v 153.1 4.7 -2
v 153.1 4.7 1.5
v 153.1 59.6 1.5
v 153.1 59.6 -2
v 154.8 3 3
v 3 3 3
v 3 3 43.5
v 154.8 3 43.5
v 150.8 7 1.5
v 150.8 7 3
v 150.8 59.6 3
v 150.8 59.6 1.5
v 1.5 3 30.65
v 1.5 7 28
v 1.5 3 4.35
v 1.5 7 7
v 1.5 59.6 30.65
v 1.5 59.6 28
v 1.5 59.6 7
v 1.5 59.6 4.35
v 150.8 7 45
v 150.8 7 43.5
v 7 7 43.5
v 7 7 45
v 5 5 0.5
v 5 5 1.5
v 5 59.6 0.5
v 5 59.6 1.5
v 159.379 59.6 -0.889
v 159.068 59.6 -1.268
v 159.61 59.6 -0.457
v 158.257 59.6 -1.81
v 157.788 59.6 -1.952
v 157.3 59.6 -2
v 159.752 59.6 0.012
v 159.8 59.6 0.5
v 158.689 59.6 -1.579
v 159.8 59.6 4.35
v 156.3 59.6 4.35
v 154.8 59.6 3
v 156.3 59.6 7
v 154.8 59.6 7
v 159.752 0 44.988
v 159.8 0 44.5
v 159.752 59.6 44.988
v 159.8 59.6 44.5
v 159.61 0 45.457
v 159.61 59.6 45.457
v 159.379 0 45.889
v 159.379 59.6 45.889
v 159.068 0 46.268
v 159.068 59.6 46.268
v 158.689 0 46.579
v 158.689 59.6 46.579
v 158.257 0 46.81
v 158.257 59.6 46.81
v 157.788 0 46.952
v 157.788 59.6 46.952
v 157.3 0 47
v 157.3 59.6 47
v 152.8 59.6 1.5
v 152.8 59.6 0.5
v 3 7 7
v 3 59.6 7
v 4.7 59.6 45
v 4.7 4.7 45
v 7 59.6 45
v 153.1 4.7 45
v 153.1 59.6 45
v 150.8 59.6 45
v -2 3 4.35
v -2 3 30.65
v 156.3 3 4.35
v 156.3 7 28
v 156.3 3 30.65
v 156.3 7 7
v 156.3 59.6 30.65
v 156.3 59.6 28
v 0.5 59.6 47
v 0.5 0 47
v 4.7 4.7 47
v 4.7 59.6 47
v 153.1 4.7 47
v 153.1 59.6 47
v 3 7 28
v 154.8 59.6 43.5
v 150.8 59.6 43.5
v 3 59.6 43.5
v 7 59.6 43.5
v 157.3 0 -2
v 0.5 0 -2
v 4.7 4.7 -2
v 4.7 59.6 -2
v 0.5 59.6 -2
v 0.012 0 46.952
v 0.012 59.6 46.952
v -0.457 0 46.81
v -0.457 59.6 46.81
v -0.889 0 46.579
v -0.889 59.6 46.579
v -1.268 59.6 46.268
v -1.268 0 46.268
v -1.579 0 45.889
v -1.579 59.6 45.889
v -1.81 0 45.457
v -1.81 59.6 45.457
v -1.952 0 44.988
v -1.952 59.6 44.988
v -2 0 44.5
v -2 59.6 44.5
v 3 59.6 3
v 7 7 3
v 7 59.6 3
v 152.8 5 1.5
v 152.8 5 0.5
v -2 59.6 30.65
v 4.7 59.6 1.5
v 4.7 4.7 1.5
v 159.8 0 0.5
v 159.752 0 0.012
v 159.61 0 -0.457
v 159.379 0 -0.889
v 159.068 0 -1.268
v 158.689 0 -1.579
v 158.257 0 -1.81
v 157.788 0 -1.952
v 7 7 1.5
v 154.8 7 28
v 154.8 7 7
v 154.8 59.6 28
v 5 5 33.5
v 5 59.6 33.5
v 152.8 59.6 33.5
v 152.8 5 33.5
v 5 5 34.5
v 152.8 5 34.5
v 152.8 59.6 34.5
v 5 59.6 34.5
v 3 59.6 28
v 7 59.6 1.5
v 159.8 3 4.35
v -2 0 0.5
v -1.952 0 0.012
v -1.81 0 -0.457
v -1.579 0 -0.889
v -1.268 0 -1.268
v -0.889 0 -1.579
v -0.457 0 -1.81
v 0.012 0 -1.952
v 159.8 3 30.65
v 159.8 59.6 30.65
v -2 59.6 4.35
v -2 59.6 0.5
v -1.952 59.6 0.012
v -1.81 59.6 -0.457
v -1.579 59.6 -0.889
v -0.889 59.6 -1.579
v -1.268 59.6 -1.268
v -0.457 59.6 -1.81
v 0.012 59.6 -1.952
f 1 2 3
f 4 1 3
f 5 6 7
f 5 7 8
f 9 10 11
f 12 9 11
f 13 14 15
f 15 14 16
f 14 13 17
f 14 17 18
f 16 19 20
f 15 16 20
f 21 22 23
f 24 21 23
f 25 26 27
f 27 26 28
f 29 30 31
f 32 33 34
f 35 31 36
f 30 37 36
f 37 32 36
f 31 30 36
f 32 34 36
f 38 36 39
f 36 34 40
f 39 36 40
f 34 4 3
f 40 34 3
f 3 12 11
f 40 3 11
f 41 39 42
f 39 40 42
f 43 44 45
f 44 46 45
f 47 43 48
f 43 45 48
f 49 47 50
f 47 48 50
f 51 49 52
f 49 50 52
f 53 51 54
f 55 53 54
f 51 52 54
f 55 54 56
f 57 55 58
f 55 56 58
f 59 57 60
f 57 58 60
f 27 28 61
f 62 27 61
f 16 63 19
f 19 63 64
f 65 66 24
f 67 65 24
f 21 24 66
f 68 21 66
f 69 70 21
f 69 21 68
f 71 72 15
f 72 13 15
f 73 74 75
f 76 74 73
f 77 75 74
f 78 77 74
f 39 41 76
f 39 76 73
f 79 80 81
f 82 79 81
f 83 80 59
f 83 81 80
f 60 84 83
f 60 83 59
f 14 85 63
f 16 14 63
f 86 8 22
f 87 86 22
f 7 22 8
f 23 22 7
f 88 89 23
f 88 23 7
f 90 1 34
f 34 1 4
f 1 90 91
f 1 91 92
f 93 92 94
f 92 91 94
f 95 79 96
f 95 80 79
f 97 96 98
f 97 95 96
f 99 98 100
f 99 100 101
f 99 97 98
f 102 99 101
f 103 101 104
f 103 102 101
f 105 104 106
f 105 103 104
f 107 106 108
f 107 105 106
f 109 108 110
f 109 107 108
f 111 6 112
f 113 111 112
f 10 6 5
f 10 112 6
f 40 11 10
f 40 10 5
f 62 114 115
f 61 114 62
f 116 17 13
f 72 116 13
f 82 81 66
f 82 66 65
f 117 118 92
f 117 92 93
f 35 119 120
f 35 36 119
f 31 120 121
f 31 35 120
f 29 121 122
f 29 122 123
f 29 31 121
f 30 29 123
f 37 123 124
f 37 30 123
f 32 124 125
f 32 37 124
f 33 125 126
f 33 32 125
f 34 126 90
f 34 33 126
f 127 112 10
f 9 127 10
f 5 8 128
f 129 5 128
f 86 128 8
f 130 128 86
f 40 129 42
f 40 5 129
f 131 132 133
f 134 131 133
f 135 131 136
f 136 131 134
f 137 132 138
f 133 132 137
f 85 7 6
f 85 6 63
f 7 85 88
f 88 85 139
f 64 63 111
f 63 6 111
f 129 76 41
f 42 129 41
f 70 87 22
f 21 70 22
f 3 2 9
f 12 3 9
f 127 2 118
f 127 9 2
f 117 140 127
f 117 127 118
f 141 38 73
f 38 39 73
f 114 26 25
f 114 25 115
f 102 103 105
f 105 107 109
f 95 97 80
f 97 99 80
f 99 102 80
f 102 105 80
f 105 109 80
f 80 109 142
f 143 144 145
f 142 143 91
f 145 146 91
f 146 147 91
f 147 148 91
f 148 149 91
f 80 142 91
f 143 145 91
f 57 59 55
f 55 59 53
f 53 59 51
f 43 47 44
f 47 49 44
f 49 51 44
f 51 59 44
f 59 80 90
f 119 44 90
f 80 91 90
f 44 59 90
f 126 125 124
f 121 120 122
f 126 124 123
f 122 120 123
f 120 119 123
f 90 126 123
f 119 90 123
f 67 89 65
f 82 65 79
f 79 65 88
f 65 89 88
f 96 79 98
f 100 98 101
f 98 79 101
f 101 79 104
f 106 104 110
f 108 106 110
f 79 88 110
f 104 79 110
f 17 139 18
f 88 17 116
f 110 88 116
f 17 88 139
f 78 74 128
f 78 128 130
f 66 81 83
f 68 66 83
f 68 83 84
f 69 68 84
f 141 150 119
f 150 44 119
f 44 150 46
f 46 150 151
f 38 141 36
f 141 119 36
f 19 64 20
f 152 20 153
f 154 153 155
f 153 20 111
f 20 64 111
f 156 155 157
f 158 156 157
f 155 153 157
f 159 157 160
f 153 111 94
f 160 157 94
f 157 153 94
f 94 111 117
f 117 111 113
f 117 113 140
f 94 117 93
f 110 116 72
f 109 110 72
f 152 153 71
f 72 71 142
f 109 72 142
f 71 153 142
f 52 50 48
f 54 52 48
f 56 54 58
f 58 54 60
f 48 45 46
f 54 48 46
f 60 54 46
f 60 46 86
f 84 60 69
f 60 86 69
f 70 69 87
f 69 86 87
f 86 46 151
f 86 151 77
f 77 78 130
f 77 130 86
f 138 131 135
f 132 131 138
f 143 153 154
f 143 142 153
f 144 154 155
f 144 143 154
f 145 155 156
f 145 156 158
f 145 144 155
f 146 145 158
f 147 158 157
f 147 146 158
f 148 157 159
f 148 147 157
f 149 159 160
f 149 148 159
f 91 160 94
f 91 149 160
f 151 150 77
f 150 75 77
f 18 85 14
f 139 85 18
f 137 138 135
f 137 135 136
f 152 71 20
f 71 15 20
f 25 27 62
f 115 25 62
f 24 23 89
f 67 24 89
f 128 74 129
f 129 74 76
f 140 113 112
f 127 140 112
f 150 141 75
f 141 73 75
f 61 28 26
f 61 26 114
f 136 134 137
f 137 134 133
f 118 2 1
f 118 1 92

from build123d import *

# Parameters (mm, degrees)
SKETCH1_W            = 157.8
SKETCH1_H            = 59.6
BOSS_EXTRUDE1_DEPTH  = 35
SHELL1_T             = -3
SKETCH2_W            = 143.8
SKETCH2_H            = 50.6
SKETCH2_H_2          = 2
CUT_EXTRUDE1_DEPTH   = 173.273039098
SKETCH2_3_W          = 147.8
SKETCH2_3_H          = 54.6
CUT_EXTRUDE2_DEPTH   = 1.5
SKETCH3_W            = 21
SKETCH3_H            = 52.6
CUT_EXTRUDE3_DEPTH   = 173.273039098
SKETCH3_3_W          = 25
SKETCH3_3_H          = 54.6
CUT_EXTRUDE4_DEPTH   = 1.5
SKETCH4_W            = 147.8
SKETCH4_H            = 54.6
BOSS_EXTRUDE2_DEPTH  = 1
SKETCH5_W            = 25
SKETCH5_H            = 54.6
BOSS_EXTRUDE3_DEPTH  = 1
SKETCH6_W            = 25.3
SKETCH6_H            = 56.6
CUT_EXTRUDE5_DEPTH   = 1.5
SKETCH7_W            = 26.3
SKETCH7_H            = 56.6
CUT_EXTRUDE6_DEPTH   = 1.5
SKETCH8_W            = 26.3
SKETCH8_H            = 56.6
CUT_EXTRUDE7_DEPTH   = 1.5
BOSS_EXTRUDE4_DEPTH  = 2
BOSS_EXTRUDE5_DEPTH  = 2
BOSS_EXTRUDE6_DEPTH  = 2
BOSS_EXTRUDE7_DEPTH  = 2
BOSS_EXTRUDE8_DEPTH  = 10
CUT_EXTRUDE8_START   = -11.5
CUT_EXTRUDE8_DEPTH   = 2.5
BOSS_EXTRUDE10_DEPTH = 1.5
CUT_EXTRUDE9_DEPTH   = 11.5
CUT_EXTRUDE10_START  = -3.5
SKETCH16_W           = 148.4
SKETCH16_H           = 55.2
CUT_EXTRUDE10_DEPTH  = 3.5
SKETCH17_W           = 148.4
SKETCH17_H           = 55.2
CUT_EXTRUDE11_DEPTH  = 2
FILLET1_R            = 2.5


with BuildPart() as part:
    # Sketch1 → Boss-Extrude1 (new body)
    with BuildSketch(Plane.XY):
        with Locations((78.9, 29.8)):
            Rectangle(SKETCH1_W, SKETCH1_H)
    extrude(amount=BOSS_EXTRUDE1_DEPTH)

    # Shell1
    shell1_openings = [part.faces().sort_by_distance(p)[0] for p in [
        (78.9, 59.6, 17.5),
    ]]
    offset(amount=SHELL1_T, openings=shell1_openings, kind=Kind.INTERSECTION)

    # Sketch2 → Cut-Extrude1 (cut, through all)
    with BuildSketch(Plane.XY.offset(35)):
        with Locations((78.9, 32.3)):
            Rectangle(SKETCH2_W, SKETCH2_H)
        with Locations((78.9, 58.6)):
            Rectangle(SKETCH2_W, SKETCH2_H_2)
    extrude(amount=-CUT_EXTRUDE1_DEPTH, mode=Mode.SUBTRACT)

    # Sketch2<3> → Cut-Extrude2 (cut)
    with BuildSketch(Plane.XY.offset(35)):
        with Locations((78.9, 32.3)):
            Rectangle(SKETCH2_3_W, SKETCH2_3_H)
    cut_extrude2 = extrude(amount=-CUT_EXTRUDE2_DEPTH, mode=Mode.SUBTRACT)

    # Mirror1: Cut-Extrude2 across plane
    add(cut_extrude2.mirror(Plane.XY.offset(17.5)), mode=Mode.SUBTRACT)

    # Sketch3 → Cut-Extrude3 (cut, through all)
    with BuildSketch(Plane(origin=(157.8, 0, 0), x_dir=(0, 0, -1), z_dir=(1, 0, 0))):
        with Locations((-17.5, 33.3)):
            Rectangle(SKETCH3_W, SKETCH3_H)
    extrude(amount=-CUT_EXTRUDE3_DEPTH, mode=Mode.SUBTRACT)

    # Sketch3<3> → Cut-Extrude4 (cut)
    with BuildSketch(Plane(origin=(157.8, 0, 0), x_dir=(0, 0, -1), z_dir=(1, 0, 0))):
        with Locations((-17.5, 32.3)):
            Rectangle(SKETCH3_3_W, SKETCH3_3_H)
    cut_extrude4 = extrude(amount=-CUT_EXTRUDE4_DEPTH, mode=Mode.SUBTRACT)

    # Mirror2: Cut-Extrude4 across plane
    add(cut_extrude4.mirror(Plane(origin=(78.9, 0, 0), x_dir=(0, 0, 1), z_dir=(1, 0, 0))), mode=Mode.SUBTRACT)

    # Sketch6 → Cut-Extrude5 (cut)
    with BuildSketch(Plane(origin=(157.8, 0, 0), x_dir=(0, 0, -1), z_dir=(1, 0, 0))):
        with Locations((-17.5, 31.3)):
            Rectangle(SKETCH6_W, SKETCH6_H)
    cut_extrude5 = extrude(amount=-CUT_EXTRUDE5_DEPTH, mode=Mode.SUBTRACT)

    # Mirror5: Cut-Extrude5 across plane
    add(cut_extrude5.mirror(Plane(origin=(78.9, 0, 0), x_dir=(0, 0, 1), z_dir=(1, 0, 0))), mode=Mode.SUBTRACT)

    # Sketch7 → Cut-Extrude6 (cut)
    with BuildSketch(Plane(origin=(157.8, 0, 0), x_dir=(0, 0, -1), z_dir=(1, 0, 0))):
        with Locations((-17.5, 31.3)):
            Rectangle(SKETCH7_W, SKETCH7_H)
    extrude(amount=-CUT_EXTRUDE6_DEPTH, mode=Mode.SUBTRACT)

    # Sketch8 → Cut-Extrude7 (cut)
    with BuildSketch(Plane.ZY):
        with Locations((17.5, 31.3)):
            Rectangle(SKETCH8_W, SKETCH8_H)
    extrude(amount=-CUT_EXTRUDE7_DEPTH, mode=Mode.SUBTRACT)

    # Sketch9 → Boss-Extrude4 (add)
    with BuildSketch(Plane(origin=(0, 0, 0), x_dir=(-1, 0, 0), z_dir=(0, 0, -1))):
        Polygon((0, 59.6), (-5, 59.6), (-5, 5), (-152.8, 5), (-152.8, 59.6), (-157.8, 59.6), (-157.8, 0), (0, 0), align=None)
    extrude(amount=BOSS_EXTRUDE4_DEPTH)

    # Sketch10 → Boss-Extrude5 (add)
    with BuildSketch(Plane.XY.offset(35)):
        Polygon((152.8, 5), (5, 5), (5, 59.6), (0, 59.6), (0, 0), (157.8, 0), (157.8, 59.6), (152.8, 59.6), align=None)
    extrude(amount=BOSS_EXTRUDE5_DEPTH)

    # Sketch11 → Boss-Extrude6 (add)
    with BuildSketch(Plane.ZY):
        Polygon((30.65, 59.6), (30.65, 3), (4.35, 3), (4.35, 59.6), (-2, 59.6), (-2, 0), (37, 0), (37, 59.6), align=None)
    extrude(amount=BOSS_EXTRUDE6_DEPTH)

    # Sketch12 → Boss-Extrude7 (add)
    with BuildSketch(Plane(origin=(157.8, 0, 0), x_dir=(0, 0, -1), z_dir=(1, 0, 0))):
        Polygon((2, 59.6), (-4.35, 59.6), (-4.35, 3), (-30.65, 3), (-30.65, 59.6), (-37, 59.6), (-37, 0), (2, 0), align=None)
    extrude(amount=BOSS_EXTRUDE7_DEPTH)

    # Sketch13 → Boss-Extrude8 (add)
    with BuildSketch(Plane.XY.offset(37)):
        Polygon((152.8, 59.6), (152.8, 5), (5, 5), (5, 59.6), (-2, 59.6), (-2, 0), (159.8, 0), (159.8, 59.6), align=None)
    extrude(amount=BOSS_EXTRUDE8_DEPTH)

    # Sketch14 → Cut-Extrude8 (cut)
    with BuildSketch(Plane.XY.offset(43.5).offset(CUT_EXTRUDE8_START)):
        Polygon((150.8, 7), (7, 7), (7, 59.6), (5, 59.6), (5, 5), (152.8, 5), (152.8, 59.6), (150.8, 59.6), align=None)
    extrude(amount=CUT_EXTRUDE8_DEPTH, mode=Mode.SUBTRACT)

    # Sketch14<2> → Boss-Extrude10 (add)
    with BuildSketch(Plane.XY.offset(43.5)):
        Polygon((150.8, 7), (7, 7), (7, 59.6), (5, 59.6), (5, 5), (152.8, 5), (152.8, 59.6), (150.8, 59.6), align=None)
    extrude(amount=BOSS_EXTRUDE10_DEPTH)

    # Sketch15 → Cut-Extrude9 (cut)
    with BuildSketch(Plane(origin=(0, 0, 32), x_dir=(-1, 0, 0), z_dir=(0, 0, -1))):
        Polygon((-152.8, 5), (-152.8, 59.6), (-154.8, 59.6), (-154.8, 3), (-3, 3), (-3, 59.6), (-5, 59.6), (-5, 5), align=None)
    extrude(amount=-CUT_EXTRUDE9_DEPTH, mode=Mode.SUBTRACT)

    # Sketch16 → Cut-Extrude10 (cut)
    with BuildSketch(Plane(origin=(0, 0, -2), x_dir=(-1, 0, 0), z_dir=(0, 0, -1)).offset(CUT_EXTRUDE10_START)):
        with Locations((-78.9, 32.3)):
            Rectangle(SKETCH16_W, SKETCH16_H)
    extrude(amount=CUT_EXTRUDE10_DEPTH, mode=Mode.SUBTRACT)

    # Sketch17 → Cut-Extrude11 (cut)
    with BuildSketch(Plane.XY.offset(47)):
        with Locations((78.9, 32.3)):
            Rectangle(SKETCH17_W, SKETCH17_H)
    extrude(amount=-CUT_EXTRUDE11_DEPTH, mode=Mode.SUBTRACT)

    # Fillet1
    fillet1_edges = [part.edges().sort_by_distance(p)[0] for p in [
        (-2, 29.8, -2),
        (159.8, 29.8, -2),
        (-2, 29.8, 47),
        (159.8, 29.8, 47),
    ]]
    fillet(fillet1_edges, radius=FILLET1_R)


with BuildPart() as body_2:
    # Sketch4 → Boss-Extrude2 (new body)
    with BuildSketch(Plane.XY.offset(33.5)):
        with Locations((78.9, 32.3)):
            Rectangle(SKETCH4_W, SKETCH4_H)
    extrude(amount=BOSS_EXTRUDE2_DEPTH)


with BuildPart() as body_3:
    # Mirror3: mirrored copy
    add(body_2.part.mirror(Plane.XY.offset(17.5)))


with BuildPart() as body_4:
    # Sketch5 → Boss-Extrude3 (new body)
    with BuildSketch(Plane(origin=(156.3, 0, 0), x_dir=(0, 0, -1), z_dir=(1, 0, 0))):
        with Locations((-17.5, 32.3)):
            Rectangle(SKETCH5_W, SKETCH5_H)
    extrude(amount=BOSS_EXTRUDE3_DEPTH)


with BuildPart() as body_5:
    # Mirror4: mirrored copy
    add(body_4.part.mirror(Plane(origin=(78.9, 0, 0), x_dir=(0, 0, 1), z_dir=(1, 0, 0))))


solid = Compound([part.part, body_2.part, body_3.part])
